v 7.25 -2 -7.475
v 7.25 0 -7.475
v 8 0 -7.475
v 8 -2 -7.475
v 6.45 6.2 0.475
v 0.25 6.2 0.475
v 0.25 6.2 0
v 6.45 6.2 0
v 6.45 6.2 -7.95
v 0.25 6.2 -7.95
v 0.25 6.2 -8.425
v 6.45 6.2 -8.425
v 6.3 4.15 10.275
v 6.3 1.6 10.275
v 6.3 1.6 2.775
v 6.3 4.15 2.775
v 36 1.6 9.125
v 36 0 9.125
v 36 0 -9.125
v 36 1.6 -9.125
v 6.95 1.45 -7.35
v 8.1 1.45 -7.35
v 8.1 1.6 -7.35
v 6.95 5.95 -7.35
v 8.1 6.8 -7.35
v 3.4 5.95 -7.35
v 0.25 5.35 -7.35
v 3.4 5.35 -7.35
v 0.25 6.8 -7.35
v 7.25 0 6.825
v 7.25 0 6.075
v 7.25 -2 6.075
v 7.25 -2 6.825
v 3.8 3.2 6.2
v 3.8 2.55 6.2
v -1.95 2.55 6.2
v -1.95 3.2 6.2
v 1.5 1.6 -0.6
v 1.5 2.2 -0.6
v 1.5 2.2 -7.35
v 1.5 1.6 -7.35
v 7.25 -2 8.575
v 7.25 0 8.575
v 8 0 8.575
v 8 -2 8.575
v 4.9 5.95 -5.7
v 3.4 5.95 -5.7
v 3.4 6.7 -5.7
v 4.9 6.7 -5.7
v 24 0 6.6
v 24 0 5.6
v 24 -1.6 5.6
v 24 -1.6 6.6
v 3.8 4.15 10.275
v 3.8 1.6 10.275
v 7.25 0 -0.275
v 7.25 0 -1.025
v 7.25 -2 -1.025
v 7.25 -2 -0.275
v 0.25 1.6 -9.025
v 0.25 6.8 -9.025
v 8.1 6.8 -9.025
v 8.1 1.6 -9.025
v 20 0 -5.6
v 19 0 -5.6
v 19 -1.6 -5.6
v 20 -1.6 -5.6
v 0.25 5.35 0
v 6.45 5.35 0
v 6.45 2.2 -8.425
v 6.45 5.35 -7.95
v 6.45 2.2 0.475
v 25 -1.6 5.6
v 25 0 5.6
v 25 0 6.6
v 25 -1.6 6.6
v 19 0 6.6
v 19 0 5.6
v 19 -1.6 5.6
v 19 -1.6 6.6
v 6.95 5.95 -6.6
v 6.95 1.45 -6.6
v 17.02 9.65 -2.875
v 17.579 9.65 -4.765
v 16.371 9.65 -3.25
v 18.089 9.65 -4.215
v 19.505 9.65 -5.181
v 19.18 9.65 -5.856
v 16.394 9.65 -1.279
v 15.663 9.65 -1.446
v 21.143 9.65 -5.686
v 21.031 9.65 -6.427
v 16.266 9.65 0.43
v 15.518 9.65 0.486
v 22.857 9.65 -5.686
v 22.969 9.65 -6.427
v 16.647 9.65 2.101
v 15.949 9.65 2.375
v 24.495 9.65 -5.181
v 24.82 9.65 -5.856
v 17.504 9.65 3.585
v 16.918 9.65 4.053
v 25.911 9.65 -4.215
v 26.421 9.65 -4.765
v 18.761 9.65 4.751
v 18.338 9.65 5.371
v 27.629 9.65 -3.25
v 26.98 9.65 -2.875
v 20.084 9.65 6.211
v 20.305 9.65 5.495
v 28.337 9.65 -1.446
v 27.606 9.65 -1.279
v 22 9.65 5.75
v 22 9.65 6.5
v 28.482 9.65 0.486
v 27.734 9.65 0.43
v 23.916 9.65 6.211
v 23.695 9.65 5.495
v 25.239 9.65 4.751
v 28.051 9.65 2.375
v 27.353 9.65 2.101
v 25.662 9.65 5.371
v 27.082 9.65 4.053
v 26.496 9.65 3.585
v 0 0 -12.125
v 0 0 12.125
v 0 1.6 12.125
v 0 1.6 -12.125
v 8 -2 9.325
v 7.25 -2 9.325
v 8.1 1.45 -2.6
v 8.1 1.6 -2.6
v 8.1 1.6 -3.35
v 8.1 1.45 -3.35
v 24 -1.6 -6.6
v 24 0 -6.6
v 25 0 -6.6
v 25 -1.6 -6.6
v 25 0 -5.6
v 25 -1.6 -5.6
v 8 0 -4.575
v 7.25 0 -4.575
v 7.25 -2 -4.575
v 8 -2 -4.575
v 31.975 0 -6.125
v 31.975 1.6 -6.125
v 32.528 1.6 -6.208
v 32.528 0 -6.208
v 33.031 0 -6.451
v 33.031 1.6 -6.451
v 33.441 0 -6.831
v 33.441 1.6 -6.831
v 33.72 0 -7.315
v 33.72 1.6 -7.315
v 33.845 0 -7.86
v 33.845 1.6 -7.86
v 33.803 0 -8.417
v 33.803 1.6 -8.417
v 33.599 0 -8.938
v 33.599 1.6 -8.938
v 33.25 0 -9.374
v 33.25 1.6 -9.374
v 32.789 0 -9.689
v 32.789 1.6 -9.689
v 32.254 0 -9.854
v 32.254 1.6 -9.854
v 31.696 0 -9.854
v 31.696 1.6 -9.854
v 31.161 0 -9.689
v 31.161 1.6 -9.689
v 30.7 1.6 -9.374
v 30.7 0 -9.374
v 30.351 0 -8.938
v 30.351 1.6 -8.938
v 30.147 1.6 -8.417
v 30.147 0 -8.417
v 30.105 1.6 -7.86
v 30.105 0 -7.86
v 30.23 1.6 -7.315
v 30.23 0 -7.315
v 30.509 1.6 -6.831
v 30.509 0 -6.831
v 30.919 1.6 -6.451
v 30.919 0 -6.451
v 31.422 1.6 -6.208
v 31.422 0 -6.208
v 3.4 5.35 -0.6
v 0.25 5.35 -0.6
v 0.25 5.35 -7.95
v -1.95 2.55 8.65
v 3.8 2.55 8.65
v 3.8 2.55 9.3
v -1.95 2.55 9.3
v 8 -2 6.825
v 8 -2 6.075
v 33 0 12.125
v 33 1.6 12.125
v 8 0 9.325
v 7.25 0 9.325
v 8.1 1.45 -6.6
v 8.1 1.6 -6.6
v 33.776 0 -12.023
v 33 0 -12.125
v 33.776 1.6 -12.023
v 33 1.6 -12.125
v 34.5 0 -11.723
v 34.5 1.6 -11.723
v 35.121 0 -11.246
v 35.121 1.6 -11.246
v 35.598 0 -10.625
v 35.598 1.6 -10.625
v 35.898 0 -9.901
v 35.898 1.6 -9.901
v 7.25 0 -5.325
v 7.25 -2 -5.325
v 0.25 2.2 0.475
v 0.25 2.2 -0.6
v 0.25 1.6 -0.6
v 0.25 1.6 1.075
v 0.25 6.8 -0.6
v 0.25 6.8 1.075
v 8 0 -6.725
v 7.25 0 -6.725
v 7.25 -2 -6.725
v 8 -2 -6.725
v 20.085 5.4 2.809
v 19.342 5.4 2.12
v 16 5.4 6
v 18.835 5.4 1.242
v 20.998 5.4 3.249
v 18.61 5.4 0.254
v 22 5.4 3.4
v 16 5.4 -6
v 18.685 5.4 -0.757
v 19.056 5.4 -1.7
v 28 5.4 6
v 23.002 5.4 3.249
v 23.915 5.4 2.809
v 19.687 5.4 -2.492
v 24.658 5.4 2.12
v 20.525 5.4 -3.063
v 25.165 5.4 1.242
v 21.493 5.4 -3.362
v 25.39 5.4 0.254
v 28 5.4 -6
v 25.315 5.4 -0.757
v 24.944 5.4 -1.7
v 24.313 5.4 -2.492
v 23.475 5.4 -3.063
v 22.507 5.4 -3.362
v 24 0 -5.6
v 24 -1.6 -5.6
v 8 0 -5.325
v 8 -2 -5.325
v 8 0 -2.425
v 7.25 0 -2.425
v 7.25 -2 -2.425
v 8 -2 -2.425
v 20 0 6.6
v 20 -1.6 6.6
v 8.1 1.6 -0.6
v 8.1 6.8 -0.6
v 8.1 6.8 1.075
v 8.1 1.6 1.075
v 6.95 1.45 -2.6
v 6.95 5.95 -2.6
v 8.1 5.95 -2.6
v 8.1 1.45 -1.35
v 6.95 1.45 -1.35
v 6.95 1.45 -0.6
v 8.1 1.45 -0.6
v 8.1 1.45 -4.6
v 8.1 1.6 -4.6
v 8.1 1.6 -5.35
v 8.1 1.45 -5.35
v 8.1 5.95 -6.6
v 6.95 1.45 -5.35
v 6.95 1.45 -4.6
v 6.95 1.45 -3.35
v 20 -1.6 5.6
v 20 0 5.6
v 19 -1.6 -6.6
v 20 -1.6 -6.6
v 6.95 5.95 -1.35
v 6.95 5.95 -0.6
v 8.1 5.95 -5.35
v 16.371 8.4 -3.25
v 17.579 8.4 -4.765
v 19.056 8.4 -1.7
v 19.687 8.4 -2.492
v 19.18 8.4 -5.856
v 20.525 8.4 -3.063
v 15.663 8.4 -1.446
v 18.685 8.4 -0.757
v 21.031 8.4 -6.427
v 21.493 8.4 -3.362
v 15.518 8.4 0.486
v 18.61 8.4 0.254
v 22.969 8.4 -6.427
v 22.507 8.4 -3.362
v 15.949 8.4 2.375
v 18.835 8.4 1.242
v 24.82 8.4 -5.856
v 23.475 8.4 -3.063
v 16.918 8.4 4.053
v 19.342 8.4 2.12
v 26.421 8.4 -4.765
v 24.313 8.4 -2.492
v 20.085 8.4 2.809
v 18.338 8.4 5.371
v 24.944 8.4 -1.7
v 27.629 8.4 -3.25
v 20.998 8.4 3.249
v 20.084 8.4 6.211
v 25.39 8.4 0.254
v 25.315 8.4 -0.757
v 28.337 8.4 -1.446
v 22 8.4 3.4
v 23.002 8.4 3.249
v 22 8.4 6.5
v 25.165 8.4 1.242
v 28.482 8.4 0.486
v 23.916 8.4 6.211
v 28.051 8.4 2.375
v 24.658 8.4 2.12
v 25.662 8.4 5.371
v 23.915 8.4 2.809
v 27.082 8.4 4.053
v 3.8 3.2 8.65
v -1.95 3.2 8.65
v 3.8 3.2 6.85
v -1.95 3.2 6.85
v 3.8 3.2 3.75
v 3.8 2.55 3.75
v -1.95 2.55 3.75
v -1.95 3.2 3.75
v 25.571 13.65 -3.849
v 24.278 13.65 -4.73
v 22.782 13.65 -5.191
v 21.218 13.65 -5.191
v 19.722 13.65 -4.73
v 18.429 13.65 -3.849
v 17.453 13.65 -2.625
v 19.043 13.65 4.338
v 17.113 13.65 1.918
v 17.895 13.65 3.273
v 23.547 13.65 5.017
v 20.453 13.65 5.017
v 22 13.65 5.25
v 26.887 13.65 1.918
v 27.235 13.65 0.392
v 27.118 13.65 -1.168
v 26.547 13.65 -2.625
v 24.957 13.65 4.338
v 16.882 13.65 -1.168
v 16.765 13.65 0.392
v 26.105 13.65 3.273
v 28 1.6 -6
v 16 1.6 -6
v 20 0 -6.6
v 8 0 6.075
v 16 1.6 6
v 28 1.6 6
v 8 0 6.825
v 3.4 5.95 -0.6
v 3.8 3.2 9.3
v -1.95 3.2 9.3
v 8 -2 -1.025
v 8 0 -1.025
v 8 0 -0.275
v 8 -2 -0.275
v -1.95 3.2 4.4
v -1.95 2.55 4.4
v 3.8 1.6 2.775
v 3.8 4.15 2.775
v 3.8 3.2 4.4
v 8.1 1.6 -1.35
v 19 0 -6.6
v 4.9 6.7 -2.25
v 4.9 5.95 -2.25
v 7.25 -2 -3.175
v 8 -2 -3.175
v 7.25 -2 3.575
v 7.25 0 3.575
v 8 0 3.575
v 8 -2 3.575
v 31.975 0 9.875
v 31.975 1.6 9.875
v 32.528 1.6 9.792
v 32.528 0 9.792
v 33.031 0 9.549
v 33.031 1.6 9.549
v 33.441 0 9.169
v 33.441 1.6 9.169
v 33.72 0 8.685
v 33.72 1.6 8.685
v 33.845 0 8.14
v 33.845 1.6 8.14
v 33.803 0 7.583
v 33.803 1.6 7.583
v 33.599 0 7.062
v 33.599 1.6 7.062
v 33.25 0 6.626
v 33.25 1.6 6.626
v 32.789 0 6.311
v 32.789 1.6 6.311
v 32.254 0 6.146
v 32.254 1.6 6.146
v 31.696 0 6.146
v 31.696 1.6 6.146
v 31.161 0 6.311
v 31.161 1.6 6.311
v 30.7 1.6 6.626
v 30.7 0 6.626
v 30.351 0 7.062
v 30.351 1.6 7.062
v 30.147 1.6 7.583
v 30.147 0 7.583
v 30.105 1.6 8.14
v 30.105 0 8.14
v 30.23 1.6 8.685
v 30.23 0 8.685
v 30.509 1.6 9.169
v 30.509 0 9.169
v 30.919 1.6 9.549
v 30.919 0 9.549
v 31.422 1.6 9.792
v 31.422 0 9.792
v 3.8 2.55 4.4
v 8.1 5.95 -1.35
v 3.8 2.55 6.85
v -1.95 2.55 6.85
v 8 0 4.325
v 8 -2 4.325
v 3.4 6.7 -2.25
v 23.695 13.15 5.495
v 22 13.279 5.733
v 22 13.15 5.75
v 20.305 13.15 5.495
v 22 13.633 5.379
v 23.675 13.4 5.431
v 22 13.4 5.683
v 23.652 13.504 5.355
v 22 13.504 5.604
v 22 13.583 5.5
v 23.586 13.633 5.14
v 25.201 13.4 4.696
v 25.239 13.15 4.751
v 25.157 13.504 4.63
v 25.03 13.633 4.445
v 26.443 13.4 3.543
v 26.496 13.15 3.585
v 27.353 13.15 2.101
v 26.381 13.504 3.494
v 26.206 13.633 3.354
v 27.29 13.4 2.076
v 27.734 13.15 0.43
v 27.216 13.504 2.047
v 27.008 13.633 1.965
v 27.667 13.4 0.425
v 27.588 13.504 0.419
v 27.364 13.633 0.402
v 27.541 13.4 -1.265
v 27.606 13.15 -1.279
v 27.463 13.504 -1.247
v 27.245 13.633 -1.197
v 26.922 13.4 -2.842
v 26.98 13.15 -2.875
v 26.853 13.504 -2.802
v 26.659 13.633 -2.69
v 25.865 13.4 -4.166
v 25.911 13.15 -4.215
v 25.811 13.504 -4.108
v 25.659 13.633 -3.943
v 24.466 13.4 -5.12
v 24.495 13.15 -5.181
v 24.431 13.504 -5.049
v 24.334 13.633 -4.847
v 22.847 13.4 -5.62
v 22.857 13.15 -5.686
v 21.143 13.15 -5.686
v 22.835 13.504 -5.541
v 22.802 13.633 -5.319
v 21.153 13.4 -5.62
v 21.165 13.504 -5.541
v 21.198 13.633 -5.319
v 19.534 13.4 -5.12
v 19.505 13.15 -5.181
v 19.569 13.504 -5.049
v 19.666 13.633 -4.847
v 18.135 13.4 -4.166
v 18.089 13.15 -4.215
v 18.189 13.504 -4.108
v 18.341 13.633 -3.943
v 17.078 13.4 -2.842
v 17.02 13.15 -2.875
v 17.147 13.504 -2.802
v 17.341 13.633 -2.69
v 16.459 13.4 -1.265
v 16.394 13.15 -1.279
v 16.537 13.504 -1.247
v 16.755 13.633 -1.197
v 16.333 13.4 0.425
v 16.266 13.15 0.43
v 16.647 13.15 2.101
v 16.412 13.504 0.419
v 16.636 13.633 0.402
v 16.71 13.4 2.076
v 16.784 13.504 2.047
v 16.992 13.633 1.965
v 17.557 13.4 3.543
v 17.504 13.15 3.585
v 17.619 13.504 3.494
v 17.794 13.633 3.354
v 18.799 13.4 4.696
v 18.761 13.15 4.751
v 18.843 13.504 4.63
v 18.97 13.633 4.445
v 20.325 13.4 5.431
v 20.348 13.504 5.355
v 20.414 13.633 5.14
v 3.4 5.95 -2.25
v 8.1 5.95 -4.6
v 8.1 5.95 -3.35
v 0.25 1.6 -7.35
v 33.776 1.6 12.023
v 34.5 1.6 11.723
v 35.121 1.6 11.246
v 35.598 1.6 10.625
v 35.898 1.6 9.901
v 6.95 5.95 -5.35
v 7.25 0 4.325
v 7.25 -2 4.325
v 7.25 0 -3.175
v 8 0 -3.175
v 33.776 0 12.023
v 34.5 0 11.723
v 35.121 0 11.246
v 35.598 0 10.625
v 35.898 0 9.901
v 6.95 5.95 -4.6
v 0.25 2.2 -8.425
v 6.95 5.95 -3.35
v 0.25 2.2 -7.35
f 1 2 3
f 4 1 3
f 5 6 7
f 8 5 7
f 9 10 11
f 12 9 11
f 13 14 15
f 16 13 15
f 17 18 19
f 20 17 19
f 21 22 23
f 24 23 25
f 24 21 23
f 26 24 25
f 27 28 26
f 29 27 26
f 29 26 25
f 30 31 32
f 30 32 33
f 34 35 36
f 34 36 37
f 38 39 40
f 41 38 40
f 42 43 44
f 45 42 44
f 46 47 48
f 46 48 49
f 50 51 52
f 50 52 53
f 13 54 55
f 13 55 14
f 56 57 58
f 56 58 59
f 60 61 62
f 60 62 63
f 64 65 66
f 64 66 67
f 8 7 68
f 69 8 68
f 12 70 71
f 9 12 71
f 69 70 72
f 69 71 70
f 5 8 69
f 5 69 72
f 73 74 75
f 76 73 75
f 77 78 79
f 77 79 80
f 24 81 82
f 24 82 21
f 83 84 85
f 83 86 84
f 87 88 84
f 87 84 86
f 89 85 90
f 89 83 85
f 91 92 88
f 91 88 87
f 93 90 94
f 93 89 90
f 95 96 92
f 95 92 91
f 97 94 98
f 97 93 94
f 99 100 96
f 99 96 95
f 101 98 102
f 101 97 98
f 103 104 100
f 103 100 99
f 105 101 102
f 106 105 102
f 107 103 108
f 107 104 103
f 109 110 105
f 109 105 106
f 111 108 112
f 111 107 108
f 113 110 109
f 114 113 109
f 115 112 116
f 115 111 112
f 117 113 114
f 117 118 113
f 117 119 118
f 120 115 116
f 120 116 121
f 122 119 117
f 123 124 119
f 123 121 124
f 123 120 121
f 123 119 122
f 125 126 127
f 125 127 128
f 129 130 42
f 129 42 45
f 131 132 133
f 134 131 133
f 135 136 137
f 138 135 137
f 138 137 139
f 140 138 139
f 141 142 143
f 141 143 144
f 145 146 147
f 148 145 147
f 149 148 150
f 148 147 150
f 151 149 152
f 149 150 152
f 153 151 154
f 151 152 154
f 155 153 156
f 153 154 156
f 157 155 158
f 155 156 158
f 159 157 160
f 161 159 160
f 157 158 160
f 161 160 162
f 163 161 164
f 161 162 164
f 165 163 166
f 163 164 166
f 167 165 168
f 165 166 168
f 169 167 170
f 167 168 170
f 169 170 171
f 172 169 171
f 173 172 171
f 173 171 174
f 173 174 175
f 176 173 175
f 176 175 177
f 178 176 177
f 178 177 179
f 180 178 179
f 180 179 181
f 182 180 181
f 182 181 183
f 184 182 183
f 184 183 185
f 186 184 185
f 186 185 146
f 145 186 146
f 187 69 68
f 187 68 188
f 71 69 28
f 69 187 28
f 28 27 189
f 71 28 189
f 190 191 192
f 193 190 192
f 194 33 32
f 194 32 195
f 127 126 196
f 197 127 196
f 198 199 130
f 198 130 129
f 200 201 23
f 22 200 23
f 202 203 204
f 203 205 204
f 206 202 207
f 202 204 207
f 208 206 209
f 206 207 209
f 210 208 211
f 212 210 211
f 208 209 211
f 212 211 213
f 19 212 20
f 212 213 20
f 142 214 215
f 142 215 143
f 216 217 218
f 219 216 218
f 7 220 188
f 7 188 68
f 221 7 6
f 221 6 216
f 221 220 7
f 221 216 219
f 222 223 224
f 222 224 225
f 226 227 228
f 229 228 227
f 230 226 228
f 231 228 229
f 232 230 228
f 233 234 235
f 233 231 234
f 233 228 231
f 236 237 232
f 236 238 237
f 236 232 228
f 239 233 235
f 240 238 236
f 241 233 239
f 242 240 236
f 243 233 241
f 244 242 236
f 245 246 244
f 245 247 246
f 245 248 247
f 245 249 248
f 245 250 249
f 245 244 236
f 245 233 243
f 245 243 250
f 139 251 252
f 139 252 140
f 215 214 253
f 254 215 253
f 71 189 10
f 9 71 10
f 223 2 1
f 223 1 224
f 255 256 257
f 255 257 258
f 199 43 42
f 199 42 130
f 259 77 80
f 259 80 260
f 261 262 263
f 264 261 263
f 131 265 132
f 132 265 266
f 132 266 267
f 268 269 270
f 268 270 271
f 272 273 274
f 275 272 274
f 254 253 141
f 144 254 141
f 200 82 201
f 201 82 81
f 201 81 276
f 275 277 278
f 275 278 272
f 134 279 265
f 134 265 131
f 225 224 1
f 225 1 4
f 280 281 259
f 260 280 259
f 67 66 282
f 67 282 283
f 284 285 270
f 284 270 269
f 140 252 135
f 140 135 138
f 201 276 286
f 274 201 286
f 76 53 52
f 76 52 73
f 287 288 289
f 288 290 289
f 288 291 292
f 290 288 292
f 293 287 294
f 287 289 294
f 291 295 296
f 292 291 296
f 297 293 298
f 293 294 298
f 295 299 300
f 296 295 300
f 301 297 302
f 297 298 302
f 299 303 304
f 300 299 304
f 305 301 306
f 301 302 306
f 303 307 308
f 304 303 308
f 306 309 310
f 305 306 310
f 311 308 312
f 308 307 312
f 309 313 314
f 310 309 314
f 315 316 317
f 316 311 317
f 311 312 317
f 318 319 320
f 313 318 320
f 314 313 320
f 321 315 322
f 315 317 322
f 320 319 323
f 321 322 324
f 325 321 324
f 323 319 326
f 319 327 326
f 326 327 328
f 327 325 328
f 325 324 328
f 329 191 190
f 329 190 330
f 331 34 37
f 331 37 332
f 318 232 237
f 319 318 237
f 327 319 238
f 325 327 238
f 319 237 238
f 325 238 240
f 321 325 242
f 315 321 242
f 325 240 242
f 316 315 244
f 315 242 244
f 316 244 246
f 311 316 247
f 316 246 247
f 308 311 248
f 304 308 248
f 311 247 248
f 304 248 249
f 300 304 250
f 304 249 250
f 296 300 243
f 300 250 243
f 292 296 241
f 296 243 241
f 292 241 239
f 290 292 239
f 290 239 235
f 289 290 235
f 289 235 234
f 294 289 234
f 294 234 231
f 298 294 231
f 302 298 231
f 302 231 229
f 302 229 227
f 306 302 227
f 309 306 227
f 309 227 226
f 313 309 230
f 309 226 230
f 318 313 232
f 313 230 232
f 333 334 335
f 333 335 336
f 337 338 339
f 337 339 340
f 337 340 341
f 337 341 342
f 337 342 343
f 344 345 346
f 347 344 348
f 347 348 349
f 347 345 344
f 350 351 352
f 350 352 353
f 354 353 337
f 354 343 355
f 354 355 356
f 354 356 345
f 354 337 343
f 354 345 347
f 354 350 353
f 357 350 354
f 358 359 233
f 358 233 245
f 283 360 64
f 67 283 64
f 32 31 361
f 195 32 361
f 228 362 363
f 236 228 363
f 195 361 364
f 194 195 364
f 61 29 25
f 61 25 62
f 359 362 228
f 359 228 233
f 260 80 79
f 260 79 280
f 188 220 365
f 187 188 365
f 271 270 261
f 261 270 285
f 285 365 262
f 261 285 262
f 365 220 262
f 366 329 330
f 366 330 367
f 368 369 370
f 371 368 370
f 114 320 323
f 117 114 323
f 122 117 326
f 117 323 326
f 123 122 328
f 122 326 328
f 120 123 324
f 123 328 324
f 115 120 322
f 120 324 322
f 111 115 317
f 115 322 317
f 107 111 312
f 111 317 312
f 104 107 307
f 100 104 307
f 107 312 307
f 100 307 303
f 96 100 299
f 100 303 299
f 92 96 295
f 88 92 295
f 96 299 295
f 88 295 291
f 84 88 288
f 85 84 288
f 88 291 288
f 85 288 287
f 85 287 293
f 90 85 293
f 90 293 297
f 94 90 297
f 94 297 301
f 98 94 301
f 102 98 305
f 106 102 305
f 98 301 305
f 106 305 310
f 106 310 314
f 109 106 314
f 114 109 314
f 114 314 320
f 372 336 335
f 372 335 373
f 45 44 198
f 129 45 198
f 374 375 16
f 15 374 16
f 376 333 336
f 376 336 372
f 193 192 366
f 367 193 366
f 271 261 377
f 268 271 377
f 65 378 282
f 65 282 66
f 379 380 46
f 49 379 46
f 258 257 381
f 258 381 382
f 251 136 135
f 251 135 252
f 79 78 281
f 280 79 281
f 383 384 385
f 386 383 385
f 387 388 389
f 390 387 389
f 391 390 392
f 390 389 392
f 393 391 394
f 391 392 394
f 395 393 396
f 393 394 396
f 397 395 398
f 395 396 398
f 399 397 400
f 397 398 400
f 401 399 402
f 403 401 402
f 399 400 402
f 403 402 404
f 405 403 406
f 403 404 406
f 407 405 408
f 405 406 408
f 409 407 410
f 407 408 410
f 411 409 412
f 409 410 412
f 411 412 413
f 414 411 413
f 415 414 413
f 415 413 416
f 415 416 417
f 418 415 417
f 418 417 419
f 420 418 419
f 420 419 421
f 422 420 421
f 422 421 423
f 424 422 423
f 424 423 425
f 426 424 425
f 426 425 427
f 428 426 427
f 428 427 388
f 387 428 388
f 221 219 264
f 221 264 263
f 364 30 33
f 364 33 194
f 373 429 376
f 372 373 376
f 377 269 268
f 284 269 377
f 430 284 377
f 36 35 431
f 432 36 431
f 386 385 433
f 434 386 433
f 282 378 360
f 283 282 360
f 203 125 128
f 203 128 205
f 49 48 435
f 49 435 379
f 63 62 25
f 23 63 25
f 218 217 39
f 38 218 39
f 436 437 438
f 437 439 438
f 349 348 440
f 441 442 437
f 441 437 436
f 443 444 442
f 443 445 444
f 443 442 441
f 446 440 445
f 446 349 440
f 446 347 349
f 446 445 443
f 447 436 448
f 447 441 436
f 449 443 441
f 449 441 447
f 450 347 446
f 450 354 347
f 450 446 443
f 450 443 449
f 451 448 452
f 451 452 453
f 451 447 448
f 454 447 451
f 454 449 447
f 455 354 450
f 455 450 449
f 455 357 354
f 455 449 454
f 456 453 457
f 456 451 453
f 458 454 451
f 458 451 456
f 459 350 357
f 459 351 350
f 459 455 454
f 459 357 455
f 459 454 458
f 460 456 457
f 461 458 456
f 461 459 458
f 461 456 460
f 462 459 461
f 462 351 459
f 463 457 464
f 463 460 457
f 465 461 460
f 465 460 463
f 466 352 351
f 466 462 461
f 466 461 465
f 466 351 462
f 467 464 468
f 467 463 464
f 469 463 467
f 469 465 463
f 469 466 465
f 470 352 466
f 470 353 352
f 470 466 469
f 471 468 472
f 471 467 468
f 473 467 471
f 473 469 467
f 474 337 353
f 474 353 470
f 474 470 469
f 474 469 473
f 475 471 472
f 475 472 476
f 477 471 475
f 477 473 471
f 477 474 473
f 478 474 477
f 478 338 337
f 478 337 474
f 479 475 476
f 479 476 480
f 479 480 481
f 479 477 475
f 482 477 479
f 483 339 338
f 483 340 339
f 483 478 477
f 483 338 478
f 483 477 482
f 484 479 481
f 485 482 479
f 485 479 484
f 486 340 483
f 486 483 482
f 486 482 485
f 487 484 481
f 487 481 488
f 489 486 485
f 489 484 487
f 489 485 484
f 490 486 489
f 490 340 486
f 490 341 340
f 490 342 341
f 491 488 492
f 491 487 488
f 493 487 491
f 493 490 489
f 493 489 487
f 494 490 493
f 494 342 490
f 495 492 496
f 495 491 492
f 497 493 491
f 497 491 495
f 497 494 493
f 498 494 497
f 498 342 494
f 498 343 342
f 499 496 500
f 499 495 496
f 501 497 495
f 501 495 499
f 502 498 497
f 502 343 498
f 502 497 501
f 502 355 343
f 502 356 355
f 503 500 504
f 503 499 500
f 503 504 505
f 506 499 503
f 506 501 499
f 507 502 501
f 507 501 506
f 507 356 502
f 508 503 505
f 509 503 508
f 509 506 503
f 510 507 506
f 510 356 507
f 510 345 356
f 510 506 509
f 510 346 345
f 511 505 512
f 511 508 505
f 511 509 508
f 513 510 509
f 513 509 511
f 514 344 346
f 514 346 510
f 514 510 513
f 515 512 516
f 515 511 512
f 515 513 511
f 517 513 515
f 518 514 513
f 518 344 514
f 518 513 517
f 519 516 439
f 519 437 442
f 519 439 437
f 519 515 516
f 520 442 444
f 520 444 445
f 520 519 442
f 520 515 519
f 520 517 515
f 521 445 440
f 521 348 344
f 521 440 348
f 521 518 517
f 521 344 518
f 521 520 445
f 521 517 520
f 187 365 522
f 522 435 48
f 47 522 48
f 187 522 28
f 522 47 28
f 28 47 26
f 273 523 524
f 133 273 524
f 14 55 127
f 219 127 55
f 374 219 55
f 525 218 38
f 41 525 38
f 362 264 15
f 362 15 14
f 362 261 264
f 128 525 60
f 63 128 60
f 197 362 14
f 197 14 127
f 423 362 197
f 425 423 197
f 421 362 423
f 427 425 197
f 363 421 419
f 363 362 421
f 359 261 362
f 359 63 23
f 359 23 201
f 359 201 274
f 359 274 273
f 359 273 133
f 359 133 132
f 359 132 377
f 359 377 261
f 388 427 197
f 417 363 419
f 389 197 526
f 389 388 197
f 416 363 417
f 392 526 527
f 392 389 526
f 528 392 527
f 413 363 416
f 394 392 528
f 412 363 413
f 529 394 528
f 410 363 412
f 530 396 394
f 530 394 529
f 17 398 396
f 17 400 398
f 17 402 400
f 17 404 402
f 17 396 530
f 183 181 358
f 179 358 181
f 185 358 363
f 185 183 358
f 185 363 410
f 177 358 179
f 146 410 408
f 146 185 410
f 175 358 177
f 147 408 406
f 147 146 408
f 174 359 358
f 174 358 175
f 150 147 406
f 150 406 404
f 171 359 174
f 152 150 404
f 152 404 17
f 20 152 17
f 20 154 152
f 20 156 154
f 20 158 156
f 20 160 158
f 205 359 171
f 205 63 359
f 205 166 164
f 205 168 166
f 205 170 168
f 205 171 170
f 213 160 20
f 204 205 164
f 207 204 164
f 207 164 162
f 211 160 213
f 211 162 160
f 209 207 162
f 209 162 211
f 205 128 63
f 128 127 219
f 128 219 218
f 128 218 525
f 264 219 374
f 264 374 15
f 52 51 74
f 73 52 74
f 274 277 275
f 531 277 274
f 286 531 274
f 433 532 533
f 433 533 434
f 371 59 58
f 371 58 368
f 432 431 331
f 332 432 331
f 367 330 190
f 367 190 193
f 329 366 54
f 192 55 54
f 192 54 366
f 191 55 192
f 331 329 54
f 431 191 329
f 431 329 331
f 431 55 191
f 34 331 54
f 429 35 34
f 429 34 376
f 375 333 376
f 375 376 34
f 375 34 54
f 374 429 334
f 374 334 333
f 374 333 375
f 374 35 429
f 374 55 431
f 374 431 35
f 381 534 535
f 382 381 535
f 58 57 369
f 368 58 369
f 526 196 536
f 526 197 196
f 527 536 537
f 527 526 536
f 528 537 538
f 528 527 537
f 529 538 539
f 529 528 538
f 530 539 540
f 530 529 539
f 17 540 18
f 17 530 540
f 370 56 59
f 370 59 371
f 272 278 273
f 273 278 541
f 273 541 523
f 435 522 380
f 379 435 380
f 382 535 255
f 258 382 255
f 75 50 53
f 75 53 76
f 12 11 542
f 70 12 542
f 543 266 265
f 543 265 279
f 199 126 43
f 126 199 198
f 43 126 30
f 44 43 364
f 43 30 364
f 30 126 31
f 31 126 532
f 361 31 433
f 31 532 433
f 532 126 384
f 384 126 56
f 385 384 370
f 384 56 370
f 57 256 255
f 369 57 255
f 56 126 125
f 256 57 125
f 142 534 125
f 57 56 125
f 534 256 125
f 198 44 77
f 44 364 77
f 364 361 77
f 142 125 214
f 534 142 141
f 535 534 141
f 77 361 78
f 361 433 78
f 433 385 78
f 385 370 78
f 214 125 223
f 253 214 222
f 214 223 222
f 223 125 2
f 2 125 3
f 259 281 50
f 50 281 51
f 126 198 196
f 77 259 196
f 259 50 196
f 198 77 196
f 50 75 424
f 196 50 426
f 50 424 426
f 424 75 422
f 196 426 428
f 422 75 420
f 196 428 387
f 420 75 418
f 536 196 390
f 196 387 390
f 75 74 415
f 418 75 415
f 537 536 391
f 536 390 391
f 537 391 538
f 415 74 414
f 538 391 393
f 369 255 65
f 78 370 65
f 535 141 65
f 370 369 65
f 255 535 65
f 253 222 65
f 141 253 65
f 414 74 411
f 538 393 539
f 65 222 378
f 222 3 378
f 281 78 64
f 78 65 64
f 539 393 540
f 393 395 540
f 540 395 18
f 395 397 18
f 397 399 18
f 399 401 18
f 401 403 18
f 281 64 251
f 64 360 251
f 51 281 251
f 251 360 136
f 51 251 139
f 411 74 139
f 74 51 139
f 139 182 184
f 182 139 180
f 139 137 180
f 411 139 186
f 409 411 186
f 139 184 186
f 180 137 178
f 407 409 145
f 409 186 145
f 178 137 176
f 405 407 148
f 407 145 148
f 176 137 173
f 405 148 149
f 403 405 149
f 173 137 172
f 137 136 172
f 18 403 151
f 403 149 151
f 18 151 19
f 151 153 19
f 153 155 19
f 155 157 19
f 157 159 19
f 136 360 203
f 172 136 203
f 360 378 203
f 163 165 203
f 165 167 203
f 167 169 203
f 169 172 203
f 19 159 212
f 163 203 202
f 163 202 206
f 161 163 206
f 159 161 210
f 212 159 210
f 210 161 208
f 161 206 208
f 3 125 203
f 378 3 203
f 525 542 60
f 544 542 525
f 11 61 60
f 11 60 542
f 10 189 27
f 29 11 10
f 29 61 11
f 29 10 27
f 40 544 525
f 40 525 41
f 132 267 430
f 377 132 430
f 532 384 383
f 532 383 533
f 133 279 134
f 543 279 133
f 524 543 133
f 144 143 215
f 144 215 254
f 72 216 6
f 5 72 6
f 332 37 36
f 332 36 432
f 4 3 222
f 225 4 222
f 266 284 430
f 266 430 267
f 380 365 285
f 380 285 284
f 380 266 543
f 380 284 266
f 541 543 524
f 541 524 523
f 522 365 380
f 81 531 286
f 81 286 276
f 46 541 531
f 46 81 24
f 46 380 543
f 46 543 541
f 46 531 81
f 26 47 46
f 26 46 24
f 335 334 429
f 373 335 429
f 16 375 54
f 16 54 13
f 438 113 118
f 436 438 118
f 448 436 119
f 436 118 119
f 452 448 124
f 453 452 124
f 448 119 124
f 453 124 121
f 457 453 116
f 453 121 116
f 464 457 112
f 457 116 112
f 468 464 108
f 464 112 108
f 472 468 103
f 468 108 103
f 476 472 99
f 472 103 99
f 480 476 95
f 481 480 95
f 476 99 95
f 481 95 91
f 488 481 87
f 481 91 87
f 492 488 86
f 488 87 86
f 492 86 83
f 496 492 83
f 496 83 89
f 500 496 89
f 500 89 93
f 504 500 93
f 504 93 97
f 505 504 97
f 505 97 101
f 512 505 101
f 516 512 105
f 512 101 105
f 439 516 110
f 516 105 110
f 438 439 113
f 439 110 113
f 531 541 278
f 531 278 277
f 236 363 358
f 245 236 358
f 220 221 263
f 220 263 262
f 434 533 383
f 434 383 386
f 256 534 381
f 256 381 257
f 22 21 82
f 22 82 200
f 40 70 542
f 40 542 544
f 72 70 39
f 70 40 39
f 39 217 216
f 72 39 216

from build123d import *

# Parameters (mm, degrees)
SKETCH1_W            = 36
SKETCH1_H            = 24.25
BOSS_EXTRUDE1_DEPTH  = 1.6
SKETCH2_R            = 1.875
CUT_EXTRUDE1_DEPTH   = 39.020726256
FILLET1_R            = 3
SKETCH3_W            = 12
SKETCH3_H            = 12
BOSS_EXTRUDE2_DEPTH  = 3.8
SKETCH4_R            = 3.4
BOSS_EXTRUDE3_DEPTH  = 3
SKETCH5_R            = 6.5
BOSS_EXTRUDE4_DEPTH  = 1.25
SKETCH6_R            = 5.75
BOSS_EXTRUDE5_DEPTH  = 4
FILLET2_R            = 0.5
SKETCH7_W            = 2.5
SKETCH7_H            = 7.5
BOSS_EXTRUDE6_DEPTH  = 2.55
SKETCH8_W            = 0.65
SKETCH8_H            = 0.65
BOSS_EXTRUDE7_DEPTH  = 5.75
BOSS_EXTRUDE8_DEPTH  = 7.85
CUT_EXTRUDE2_DEPTH   = 6.2
SKETCH11_W           = 3.15
SKETCH11_H           = 6.75
CUT_EXTRUDE3_DEPTH   = 1
SKETCH12_W           = 1.25
SKETCH12_H           = 6.75
CUT_EXTRUDE4_DEPTH   = 0.6
SKETCH13_W           = 1.5
SKETCH13_H           = 3.45
BOSS_EXTRUDE9_DEPTH  = 0.75
SKETCH14_W           = 1.15
SKETCH14_H           = 0.75
CUT_EXTRUDE5_DEPTH   = 4.5
SKETCH15_W           = 1
SKETCH15_H           = 1
BOSS_EXTRUDE10_DEPTH = 1.6
SKETCH16_W           = 0.75
SKETCH16_H           = 0.75
BOSS_EXTRUDE11_DEPTH = 2


with BuildPart() as part:
    # Sketch1 → Boss-Extrude1 (new body)
    with BuildSketch(Plane(origin=(0, 0, 0), x_dir=(1, 0, 0), z_dir=(0, 1, 0))):
        with Locations((18, 0)):
            Rectangle(SKETCH1_W, SKETCH1_H)
    extrude(amount=BOSS_EXTRUDE1_DEPTH)

    # Sketch2 → Cut-Extrude1 (cut, through all)
    with BuildSketch(Plane(origin=(0, 1.6, 0), x_dir=(1, 0, 0), z_dir=(0, 1, 0))):
        with Locations(Location((31.975, 8, 0), (0, 0, 270))):
            Circle(SKETCH2_R)
        with Locations(Location((31.975, -8, 0), (0, 0, 270))):
            Circle(SKETCH2_R)
    extrude(amount=-CUT_EXTRUDE1_DEPTH, mode=Mode.SUBTRACT)

    # Fillet1
    fillet1_edges = [part.edges().sort_by_distance(p)[0] for p in [
        (36, 0.8, -12.125),
        (36, 0.8, 12.125),
    ]]
    fillet(fillet1_edges, radius=FILLET1_R)

    # Sketch3 → Boss-Extrude2 (add)
    with BuildSketch(Plane(origin=(0, 1.6, 0), x_dir=(1, 0, 0), z_dir=(0, 1, 0))):
        with Locations((22, 0)):
            Rectangle(SKETCH3_W, SKETCH3_H)
    extrude(amount=BOSS_EXTRUDE2_DEPTH)

    # Sketch4 → Boss-Extrude3 (add)
    with BuildSketch(Plane(origin=(0, 5.4, 0), x_dir=(1, 0, 0), z_dir=(0, 1, 0))):
        with Locations(Location((22, 0, 0), (0, 0, 270))):
            Circle(SKETCH4_R)
    extrude(amount=BOSS_EXTRUDE3_DEPTH)

    # Sketch5 → Boss-Extrude4 (add)
    with BuildSketch(Plane(origin=(0, 8.4, 0), x_dir=(1, 0, 0), z_dir=(0, 1, 0))):
        with Locations(Location((22, 0, 0), (0, 0, 270))):
            Circle(SKETCH5_R)
    extrude(amount=BOSS_EXTRUDE4_DEPTH)

    # Sketch6 → Boss-Extrude5 (add)
    with BuildSketch(Plane(origin=(0, 9.65, 0), x_dir=(1, 0, 0), z_dir=(0, 1, 0))):
        with Locations(Location((22, 0, 0), (0, 0, 270))):
            Circle(SKETCH6_R)
    extrude(amount=BOSS_EXTRUDE5_DEPTH)

    # Fillet2
    fillet2_edges = [part.edges().sort_by_distance(p)[0] for p in [
        (22, 13.65, -5.75),
    ]]
    fillet(fillet2_edges, radius=FILLET2_R)

    # Sketch7 → Boss-Extrude6 (add)
    with BuildSketch(Plane(origin=(0, 1.6, 0), x_dir=(1, 0, 0), z_dir=(0, 1, 0))):
        with Locations((5.05, -6.525)):
            Rectangle(SKETCH7_W, SKETCH7_H)
    extrude(amount=BOSS_EXTRUDE6_DEPTH)

    # Sketch8 → Boss-Extrude7 (add)
    with BuildSketch(Plane.ZY.offset(-3.8)):
        with Locations((4.075, 2.875)):
            Rectangle(SKETCH8_W, SKETCH8_H)
        with Locations((6.525, 2.875)):
            Rectangle(SKETCH8_W, SKETCH8_H)
        with Locations((8.975, 2.875)):
            Rectangle(SKETCH8_W, SKETCH8_H)
    extrude(amount=BOSS_EXTRUDE7_DEPTH)

    # Sketch9 → Boss-Extrude8 (add)
    with BuildSketch(Plane.ZY.offset(-0.25)):
        Polygon((-9.025, 1.6), (1.075, 1.6), (1.075, 6.8), (-0.6, 6.8), (-0.6, 5.95), (-7.35, 5.95), (-7.35, 6.8), (-9.025, 6.8), align=None)
    extrude(amount=-BOSS_EXTRUDE8_DEPTH)

    # Sketch10 → Cut-Extrude2 (cut)
    with BuildSketch(Plane.ZY.offset(-0.25)):
        Polygon((-8.425, 6.2), (-8.425, 2.2), (0.475, 2.2), (0.475, 6.2), (0, 6.2), (0, 5.35), (-7.95, 5.35), (-7.95, 6.2), align=None)
    extrude(amount=-CUT_EXTRUDE2_DEPTH, mode=Mode.SUBTRACT)

    # Sketch11 → Cut-Extrude3 (cut)
    with BuildSketch(Plane(origin=(0, 5.95, 0), x_dir=(1, 0, 0), z_dir=(0, 1, 0))):
        with Locations((1.825, 3.975)):
            Rectangle(SKETCH11_W, SKETCH11_H)
    extrude(amount=-CUT_EXTRUDE3_DEPTH, mode=Mode.SUBTRACT)

    # Sketch12 → Cut-Extrude4 (cut)
    with BuildSketch(Plane(origin=(0, 2.2, 0), x_dir=(1, 0, 0), z_dir=(0, 1, 0))):
        with Locations((0.875, 3.975)):
            Rectangle(SKETCH12_W, SKETCH12_H)
    extrude(amount=-CUT_EXTRUDE4_DEPTH, mode=Mode.SUBTRACT)

    # Sketch13 → Boss-Extrude9 (add)
    with BuildSketch(Plane(origin=(0, 5.95, 0), x_dir=(1, 0, 0), z_dir=(0, 1, 0))):
        with Locations((4.15, 3.975)):
            Rectangle(SKETCH13_W, SKETCH13_H)
    extrude(amount=BOSS_EXTRUDE9_DEPTH)

    # Sketch14 → Cut-Extrude5 (cut)
    with BuildSketch(Plane(origin=(0, 5.95, 0), x_dir=(1, 0, 0), z_dir=(0, 1, 0))):
        with Locations((7.525, 6.975)):
            Rectangle(SKETCH14_W, SKETCH14_H)
        with Locations((7.525, 4.975)):
            Rectangle(SKETCH14_W, SKETCH14_H)
        with Locations((7.525, 2.975)):
            Rectangle(SKETCH14_W, SKETCH14_H)
        with Locations((7.525, 0.975)):
            Rectangle(SKETCH14_W, SKETCH14_H)
    extrude(amount=-CUT_EXTRUDE5_DEPTH, mode=Mode.SUBTRACT)

    # Sketch15 → Boss-Extrude10 (add)
    with BuildSketch(Plane.XZ):
        with Locations((24.5, -6.1)):
            Rectangle(SKETCH15_W, SKETCH15_H)
        with Locations((19.5, 6.1)):
            Rectangle(SKETCH15_W, SKETCH15_H)
        with Locations((24.5, 6.1)):
            Rectangle(SKETCH15_W, SKETCH15_H)
        with Locations((19.5, -6.1)):
            Rectangle(SKETCH15_W, SKETCH15_H)
    extrude(amount=BOSS_EXTRUDE10_DEPTH)

    # Sketch16 → Boss-Extrude11 (add)
    with BuildSketch(Plane.XZ):
        with Locations((7.625, 8.95)):
            Rectangle(SKETCH16_W, SKETCH16_H)
        with Locations((7.625, 6.45)):
            Rectangle(SKETCH16_W, SKETCH16_H)
        with Locations((7.625, 3.95)):
            Rectangle(SKETCH16_W, SKETCH16_H)
        with Locations((7.625, -0.65)):
            Rectangle(SKETCH16_W, SKETCH16_H)
        with Locations((7.625, -2.8)):
            Rectangle(SKETCH16_W, SKETCH16_H)
        with Locations((7.625, -4.95)):
            Rectangle(SKETCH16_W, SKETCH16_H)
        with Locations((7.625, -7.1)):
            Rectangle(SKETCH16_W, SKETCH16_H)
    extrude(amount=BOSS_EXTRUDE11_DEPTH)


solid = part.part
